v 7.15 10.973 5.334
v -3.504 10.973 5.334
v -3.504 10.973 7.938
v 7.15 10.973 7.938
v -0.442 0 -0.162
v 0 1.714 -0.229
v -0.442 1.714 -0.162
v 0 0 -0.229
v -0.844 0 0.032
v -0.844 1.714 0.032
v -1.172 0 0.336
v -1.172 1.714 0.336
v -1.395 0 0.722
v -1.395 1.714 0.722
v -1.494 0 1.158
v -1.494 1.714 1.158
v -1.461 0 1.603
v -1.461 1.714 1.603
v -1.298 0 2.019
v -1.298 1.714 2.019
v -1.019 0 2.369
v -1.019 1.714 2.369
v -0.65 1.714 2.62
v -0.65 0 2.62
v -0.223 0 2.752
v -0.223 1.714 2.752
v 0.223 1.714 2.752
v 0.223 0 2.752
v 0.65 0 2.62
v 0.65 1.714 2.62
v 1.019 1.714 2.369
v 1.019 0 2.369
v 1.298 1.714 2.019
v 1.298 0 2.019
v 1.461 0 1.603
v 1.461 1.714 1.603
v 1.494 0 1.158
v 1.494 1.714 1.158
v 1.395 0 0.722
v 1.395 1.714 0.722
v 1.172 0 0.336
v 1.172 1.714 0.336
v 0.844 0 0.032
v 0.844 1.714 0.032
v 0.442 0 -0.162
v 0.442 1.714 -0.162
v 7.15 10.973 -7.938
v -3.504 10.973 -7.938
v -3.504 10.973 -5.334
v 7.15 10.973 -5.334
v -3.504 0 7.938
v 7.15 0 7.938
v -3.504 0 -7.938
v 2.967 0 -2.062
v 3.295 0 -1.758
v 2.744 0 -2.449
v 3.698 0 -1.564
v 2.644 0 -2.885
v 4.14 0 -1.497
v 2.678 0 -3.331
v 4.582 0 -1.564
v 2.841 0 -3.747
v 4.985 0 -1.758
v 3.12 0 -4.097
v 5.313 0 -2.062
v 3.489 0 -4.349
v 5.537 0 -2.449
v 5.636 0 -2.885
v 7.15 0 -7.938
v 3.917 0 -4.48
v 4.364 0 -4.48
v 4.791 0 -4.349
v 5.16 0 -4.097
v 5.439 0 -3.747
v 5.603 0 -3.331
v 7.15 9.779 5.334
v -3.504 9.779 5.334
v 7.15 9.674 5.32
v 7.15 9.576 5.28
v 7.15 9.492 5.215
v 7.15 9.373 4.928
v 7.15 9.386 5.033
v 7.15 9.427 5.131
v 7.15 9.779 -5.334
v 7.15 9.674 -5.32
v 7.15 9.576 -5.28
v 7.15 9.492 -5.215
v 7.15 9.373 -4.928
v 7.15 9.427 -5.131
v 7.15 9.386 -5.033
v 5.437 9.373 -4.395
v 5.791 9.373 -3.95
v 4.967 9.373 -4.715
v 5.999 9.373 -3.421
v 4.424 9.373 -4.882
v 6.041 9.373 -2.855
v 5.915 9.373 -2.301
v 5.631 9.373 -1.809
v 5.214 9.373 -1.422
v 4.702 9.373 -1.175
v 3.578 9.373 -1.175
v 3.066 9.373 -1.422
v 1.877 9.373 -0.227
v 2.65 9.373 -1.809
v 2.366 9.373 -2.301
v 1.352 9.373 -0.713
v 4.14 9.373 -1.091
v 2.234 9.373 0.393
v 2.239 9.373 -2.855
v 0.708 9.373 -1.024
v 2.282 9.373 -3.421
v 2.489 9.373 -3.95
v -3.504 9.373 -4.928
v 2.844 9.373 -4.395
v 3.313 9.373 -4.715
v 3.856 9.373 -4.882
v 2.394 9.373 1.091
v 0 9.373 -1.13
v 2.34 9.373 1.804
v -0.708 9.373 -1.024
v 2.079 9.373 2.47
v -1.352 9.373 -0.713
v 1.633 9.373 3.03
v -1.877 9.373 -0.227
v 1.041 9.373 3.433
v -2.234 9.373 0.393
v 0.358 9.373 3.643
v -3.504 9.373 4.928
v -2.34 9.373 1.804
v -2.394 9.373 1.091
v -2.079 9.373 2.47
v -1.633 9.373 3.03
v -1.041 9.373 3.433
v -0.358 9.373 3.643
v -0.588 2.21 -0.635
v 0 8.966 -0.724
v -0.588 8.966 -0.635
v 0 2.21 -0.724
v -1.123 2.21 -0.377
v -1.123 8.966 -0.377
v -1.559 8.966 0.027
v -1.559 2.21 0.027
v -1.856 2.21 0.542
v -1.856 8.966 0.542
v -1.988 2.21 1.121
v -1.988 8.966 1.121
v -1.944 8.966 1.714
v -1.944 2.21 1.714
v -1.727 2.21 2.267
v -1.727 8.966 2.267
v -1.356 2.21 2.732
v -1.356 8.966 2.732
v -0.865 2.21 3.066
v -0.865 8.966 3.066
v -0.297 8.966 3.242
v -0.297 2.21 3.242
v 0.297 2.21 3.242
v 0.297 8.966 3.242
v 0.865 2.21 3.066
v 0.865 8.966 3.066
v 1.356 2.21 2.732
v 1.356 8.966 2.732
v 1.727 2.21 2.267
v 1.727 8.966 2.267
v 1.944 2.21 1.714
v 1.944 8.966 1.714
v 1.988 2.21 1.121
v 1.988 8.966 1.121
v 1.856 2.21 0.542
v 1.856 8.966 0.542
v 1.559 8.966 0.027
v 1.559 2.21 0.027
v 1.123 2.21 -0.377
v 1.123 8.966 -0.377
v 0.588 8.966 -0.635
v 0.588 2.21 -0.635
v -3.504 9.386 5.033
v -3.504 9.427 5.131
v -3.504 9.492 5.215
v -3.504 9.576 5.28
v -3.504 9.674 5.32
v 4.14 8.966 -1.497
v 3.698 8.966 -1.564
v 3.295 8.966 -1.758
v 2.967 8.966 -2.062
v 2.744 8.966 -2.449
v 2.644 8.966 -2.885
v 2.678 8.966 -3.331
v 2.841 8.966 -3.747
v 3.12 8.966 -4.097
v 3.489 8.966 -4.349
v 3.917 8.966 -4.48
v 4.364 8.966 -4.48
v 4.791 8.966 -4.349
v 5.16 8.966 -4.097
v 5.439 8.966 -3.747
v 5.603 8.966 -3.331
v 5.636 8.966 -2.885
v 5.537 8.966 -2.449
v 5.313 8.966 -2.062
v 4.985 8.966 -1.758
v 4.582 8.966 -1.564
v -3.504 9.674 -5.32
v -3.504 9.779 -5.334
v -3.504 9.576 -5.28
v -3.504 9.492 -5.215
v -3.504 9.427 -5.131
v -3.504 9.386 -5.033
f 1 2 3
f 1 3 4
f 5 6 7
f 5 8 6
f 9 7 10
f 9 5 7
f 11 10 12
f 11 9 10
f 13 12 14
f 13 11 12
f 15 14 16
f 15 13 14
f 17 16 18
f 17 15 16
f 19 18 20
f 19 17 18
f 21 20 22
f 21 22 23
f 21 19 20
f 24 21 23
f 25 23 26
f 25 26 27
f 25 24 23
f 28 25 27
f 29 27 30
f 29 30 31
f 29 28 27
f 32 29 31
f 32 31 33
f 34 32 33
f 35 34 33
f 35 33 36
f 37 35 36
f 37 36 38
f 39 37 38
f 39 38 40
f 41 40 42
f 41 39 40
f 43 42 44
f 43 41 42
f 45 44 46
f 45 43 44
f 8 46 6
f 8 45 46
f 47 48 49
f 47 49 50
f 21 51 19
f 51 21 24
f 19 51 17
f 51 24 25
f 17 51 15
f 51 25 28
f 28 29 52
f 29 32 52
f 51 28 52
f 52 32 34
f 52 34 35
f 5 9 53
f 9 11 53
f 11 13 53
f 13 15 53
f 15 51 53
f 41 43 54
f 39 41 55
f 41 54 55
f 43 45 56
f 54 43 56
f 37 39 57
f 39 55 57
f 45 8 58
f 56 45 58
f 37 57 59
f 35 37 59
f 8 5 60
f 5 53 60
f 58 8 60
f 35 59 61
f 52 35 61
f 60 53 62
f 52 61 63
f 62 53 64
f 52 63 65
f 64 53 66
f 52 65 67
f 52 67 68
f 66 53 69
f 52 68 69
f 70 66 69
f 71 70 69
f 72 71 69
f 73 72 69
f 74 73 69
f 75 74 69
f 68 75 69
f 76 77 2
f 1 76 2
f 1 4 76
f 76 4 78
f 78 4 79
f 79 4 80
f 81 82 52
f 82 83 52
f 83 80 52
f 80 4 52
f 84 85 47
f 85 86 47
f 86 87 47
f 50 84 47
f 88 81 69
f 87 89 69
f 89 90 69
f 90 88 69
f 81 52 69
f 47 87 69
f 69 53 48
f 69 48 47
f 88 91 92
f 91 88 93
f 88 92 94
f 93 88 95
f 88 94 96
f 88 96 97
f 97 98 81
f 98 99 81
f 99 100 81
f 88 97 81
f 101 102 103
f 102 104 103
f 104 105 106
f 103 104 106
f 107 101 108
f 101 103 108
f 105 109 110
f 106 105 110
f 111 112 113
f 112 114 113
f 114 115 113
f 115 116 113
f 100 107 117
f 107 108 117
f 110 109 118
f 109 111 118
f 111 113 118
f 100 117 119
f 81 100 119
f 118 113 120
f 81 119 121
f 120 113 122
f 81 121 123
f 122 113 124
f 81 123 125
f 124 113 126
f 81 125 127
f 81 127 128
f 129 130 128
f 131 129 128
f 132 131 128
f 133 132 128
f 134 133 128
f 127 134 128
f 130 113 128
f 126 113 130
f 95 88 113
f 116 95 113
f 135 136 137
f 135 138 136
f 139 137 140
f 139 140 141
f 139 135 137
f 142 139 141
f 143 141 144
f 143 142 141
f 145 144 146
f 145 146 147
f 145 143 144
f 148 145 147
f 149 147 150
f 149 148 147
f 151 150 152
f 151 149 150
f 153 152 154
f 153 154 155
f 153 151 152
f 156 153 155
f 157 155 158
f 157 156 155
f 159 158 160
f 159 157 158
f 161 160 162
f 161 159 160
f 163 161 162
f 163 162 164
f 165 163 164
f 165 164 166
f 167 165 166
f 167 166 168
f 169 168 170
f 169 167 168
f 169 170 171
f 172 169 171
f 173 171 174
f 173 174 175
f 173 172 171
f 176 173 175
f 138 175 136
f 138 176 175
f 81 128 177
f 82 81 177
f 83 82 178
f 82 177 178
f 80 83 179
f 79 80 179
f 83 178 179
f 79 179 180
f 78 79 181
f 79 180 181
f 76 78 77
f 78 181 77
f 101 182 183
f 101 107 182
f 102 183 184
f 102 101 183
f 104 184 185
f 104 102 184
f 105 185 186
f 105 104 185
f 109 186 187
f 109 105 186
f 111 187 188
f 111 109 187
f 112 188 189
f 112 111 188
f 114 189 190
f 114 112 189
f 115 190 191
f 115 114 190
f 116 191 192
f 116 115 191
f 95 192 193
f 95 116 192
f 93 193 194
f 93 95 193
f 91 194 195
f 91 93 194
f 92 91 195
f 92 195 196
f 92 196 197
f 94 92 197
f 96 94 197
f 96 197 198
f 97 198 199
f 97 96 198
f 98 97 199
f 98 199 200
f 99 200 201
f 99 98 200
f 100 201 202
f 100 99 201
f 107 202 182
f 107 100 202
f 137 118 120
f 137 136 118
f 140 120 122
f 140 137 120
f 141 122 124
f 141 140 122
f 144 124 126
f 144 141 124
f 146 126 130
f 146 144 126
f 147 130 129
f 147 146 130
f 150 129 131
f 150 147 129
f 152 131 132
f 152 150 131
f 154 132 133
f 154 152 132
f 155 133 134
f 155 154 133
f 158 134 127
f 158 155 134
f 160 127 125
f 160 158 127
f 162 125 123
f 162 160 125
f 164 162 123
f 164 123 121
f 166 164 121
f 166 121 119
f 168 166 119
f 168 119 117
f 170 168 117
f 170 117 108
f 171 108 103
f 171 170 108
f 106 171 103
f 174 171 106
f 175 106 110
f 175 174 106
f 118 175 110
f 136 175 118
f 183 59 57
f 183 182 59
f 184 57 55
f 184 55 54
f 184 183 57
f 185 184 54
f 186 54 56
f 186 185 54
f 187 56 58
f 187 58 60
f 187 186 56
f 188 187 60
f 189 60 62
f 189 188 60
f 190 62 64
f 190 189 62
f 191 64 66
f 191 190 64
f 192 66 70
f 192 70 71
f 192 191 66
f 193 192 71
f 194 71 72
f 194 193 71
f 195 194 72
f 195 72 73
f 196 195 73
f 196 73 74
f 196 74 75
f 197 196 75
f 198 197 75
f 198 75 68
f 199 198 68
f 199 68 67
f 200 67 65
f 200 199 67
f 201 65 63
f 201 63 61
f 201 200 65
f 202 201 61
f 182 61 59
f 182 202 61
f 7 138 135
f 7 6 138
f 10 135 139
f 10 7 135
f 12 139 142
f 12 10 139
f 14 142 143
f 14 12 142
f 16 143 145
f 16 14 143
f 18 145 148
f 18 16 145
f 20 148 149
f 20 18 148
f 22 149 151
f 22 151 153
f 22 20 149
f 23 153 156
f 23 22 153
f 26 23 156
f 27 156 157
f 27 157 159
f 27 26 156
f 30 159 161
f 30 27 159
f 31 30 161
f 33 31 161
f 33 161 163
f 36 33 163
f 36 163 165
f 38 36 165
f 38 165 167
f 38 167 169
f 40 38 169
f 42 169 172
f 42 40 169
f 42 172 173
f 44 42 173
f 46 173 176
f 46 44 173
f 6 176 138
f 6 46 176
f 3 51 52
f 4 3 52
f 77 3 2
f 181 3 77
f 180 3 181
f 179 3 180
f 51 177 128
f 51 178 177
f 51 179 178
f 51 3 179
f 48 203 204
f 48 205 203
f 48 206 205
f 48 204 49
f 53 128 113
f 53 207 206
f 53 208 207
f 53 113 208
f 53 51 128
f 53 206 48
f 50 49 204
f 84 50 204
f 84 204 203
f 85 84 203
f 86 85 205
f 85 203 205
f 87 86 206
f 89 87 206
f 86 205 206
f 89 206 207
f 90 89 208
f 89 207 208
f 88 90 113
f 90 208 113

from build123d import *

# Parameters (mm, degrees)
SKETCH1_W               = 14.3002
SKETCH1_H               = 15.875
BOSS_EXTRUDE1_DEPTH     = 10.9728
CUT_EXTRUDE1_DEPTH      = 20.695226989
CUT_EXTRUDE1_DEPTH_BACK = 20.695226989
CUT_EXTRUDE2_DEPTH      = 16.314378084
CUT_EXTRUDE2_DEPTH_BACK = 16.314378084
SKETCH6_W               = 3.646294
SKETCH6_H               = 15.875


with BuildPart() as part:
    # Sketch1 → Boss-Extrude1 (new body)
    with BuildSketch(Plane(origin=(0, 0, 0), x_dir=(1, 0, 0), z_dir=(0, 1, 0))):
        Rectangle(SKETCH1_W, SKETCH1_H)
    extrude(amount=BOSS_EXTRUDE1_DEPTH)

    # Sketch5 → Cut-Extrude1 (cut, two sides: drawn at the far end of the back side and taken through both)
    with BuildSketch(Plane(origin=(7.1501, 0, 0), x_dir=(0, 0, -1), z_dir=(1, 0, 0)).offset(-CUT_EXTRUDE1_DEPTH_BACK)):
        with BuildLine():
            Line((-5.334, 10.9728), (5.334, 10.9728))
            Line((5.334, 10.9728), (5.334, 9.779))
            ThreePointArc((5.334, 9.779), (5.214968196, 9.491631804), (4.9276, 9.3726))
            Line((4.9276, 9.3726), (-4.9276, 9.3726))
            ThreePointArc((-4.9276, 9.3726), (-5.214968196, 9.491631804), (-5.334, 9.779))
            Line((-5.334, 9.779), (-5.334, 10.9728))
        make_face()
    extrude(amount=CUT_EXTRUDE1_DEPTH + CUT_EXTRUDE1_DEPTH_BACK, mode=Mode.SUBTRACT)

    # Sketch3 → Cut-Revolve1 (revolve, cut)
    with BuildSketch(Plane(origin=(0, 0, 0), x_dir=(0, 0, -1), z_dir=(1, 0, 0)), mode=Mode.PRIVATE) as cut_revolve1_sk:
        Polygon((-3.6703, 9.3726), (-3.2639, 8.9662), (-3.2639, 2.2098), (-2.7686, 1.7145), (-2.7686, 0), (-1.27, 0), (-1.27, 9.3726), align=None)
    revolve(cut_revolve1_sk.sketch.rotate(Axis((0, 0, 1.27), (0, 1, 0)), 180), axis=Axis((0, 0, 1.27), (0, 1, 0)), mode=Mode.SUBTRACT)

    # Sketch4 → Cut-Revolve2 (revolve, cut)
    with BuildSketch(Plane(origin=(4.1402, 0, 0), x_dir=(0, 0, -1), z_dir=(1, 0, 0)), mode=Mode.PRIVATE) as cut_revolve2_sk:
        Polygon((2.9972, 10.9728), (2.9972, 0), (4.4972, 0), (4.4972, 8.9662), (4.9036, 9.3726), (4.9036, 10.9728), align=None)
    revolve(cut_revolve2_sk.sketch.rotate(Axis((4.1402, 10.9728, -2.9972), (0, -1, 0)), 180), axis=Axis((4.1402, 10.9728, -2.9972), (0, -1, 0)), mode=Mode.SUBTRACT)

    # Sketch6 → Cut-Extrude2 (cut, two sides: drawn at the far end of the back side and taken through both)
    with BuildSketch(Plane(origin=(0, 10.9728, 0), x_dir=(1, 0, 0), z_dir=(0, 1, 0)).offset(-CUT_EXTRUDE2_DEPTH_BACK)):
        with Locations((-5.326953, 0)):
            Rectangle(SKETCH6_W, SKETCH6_H)
    extrude(amount=CUT_EXTRUDE2_DEPTH + CUT_EXTRUDE2_DEPTH_BACK, mode=Mode.SUBTRACT)


solid = part.part
